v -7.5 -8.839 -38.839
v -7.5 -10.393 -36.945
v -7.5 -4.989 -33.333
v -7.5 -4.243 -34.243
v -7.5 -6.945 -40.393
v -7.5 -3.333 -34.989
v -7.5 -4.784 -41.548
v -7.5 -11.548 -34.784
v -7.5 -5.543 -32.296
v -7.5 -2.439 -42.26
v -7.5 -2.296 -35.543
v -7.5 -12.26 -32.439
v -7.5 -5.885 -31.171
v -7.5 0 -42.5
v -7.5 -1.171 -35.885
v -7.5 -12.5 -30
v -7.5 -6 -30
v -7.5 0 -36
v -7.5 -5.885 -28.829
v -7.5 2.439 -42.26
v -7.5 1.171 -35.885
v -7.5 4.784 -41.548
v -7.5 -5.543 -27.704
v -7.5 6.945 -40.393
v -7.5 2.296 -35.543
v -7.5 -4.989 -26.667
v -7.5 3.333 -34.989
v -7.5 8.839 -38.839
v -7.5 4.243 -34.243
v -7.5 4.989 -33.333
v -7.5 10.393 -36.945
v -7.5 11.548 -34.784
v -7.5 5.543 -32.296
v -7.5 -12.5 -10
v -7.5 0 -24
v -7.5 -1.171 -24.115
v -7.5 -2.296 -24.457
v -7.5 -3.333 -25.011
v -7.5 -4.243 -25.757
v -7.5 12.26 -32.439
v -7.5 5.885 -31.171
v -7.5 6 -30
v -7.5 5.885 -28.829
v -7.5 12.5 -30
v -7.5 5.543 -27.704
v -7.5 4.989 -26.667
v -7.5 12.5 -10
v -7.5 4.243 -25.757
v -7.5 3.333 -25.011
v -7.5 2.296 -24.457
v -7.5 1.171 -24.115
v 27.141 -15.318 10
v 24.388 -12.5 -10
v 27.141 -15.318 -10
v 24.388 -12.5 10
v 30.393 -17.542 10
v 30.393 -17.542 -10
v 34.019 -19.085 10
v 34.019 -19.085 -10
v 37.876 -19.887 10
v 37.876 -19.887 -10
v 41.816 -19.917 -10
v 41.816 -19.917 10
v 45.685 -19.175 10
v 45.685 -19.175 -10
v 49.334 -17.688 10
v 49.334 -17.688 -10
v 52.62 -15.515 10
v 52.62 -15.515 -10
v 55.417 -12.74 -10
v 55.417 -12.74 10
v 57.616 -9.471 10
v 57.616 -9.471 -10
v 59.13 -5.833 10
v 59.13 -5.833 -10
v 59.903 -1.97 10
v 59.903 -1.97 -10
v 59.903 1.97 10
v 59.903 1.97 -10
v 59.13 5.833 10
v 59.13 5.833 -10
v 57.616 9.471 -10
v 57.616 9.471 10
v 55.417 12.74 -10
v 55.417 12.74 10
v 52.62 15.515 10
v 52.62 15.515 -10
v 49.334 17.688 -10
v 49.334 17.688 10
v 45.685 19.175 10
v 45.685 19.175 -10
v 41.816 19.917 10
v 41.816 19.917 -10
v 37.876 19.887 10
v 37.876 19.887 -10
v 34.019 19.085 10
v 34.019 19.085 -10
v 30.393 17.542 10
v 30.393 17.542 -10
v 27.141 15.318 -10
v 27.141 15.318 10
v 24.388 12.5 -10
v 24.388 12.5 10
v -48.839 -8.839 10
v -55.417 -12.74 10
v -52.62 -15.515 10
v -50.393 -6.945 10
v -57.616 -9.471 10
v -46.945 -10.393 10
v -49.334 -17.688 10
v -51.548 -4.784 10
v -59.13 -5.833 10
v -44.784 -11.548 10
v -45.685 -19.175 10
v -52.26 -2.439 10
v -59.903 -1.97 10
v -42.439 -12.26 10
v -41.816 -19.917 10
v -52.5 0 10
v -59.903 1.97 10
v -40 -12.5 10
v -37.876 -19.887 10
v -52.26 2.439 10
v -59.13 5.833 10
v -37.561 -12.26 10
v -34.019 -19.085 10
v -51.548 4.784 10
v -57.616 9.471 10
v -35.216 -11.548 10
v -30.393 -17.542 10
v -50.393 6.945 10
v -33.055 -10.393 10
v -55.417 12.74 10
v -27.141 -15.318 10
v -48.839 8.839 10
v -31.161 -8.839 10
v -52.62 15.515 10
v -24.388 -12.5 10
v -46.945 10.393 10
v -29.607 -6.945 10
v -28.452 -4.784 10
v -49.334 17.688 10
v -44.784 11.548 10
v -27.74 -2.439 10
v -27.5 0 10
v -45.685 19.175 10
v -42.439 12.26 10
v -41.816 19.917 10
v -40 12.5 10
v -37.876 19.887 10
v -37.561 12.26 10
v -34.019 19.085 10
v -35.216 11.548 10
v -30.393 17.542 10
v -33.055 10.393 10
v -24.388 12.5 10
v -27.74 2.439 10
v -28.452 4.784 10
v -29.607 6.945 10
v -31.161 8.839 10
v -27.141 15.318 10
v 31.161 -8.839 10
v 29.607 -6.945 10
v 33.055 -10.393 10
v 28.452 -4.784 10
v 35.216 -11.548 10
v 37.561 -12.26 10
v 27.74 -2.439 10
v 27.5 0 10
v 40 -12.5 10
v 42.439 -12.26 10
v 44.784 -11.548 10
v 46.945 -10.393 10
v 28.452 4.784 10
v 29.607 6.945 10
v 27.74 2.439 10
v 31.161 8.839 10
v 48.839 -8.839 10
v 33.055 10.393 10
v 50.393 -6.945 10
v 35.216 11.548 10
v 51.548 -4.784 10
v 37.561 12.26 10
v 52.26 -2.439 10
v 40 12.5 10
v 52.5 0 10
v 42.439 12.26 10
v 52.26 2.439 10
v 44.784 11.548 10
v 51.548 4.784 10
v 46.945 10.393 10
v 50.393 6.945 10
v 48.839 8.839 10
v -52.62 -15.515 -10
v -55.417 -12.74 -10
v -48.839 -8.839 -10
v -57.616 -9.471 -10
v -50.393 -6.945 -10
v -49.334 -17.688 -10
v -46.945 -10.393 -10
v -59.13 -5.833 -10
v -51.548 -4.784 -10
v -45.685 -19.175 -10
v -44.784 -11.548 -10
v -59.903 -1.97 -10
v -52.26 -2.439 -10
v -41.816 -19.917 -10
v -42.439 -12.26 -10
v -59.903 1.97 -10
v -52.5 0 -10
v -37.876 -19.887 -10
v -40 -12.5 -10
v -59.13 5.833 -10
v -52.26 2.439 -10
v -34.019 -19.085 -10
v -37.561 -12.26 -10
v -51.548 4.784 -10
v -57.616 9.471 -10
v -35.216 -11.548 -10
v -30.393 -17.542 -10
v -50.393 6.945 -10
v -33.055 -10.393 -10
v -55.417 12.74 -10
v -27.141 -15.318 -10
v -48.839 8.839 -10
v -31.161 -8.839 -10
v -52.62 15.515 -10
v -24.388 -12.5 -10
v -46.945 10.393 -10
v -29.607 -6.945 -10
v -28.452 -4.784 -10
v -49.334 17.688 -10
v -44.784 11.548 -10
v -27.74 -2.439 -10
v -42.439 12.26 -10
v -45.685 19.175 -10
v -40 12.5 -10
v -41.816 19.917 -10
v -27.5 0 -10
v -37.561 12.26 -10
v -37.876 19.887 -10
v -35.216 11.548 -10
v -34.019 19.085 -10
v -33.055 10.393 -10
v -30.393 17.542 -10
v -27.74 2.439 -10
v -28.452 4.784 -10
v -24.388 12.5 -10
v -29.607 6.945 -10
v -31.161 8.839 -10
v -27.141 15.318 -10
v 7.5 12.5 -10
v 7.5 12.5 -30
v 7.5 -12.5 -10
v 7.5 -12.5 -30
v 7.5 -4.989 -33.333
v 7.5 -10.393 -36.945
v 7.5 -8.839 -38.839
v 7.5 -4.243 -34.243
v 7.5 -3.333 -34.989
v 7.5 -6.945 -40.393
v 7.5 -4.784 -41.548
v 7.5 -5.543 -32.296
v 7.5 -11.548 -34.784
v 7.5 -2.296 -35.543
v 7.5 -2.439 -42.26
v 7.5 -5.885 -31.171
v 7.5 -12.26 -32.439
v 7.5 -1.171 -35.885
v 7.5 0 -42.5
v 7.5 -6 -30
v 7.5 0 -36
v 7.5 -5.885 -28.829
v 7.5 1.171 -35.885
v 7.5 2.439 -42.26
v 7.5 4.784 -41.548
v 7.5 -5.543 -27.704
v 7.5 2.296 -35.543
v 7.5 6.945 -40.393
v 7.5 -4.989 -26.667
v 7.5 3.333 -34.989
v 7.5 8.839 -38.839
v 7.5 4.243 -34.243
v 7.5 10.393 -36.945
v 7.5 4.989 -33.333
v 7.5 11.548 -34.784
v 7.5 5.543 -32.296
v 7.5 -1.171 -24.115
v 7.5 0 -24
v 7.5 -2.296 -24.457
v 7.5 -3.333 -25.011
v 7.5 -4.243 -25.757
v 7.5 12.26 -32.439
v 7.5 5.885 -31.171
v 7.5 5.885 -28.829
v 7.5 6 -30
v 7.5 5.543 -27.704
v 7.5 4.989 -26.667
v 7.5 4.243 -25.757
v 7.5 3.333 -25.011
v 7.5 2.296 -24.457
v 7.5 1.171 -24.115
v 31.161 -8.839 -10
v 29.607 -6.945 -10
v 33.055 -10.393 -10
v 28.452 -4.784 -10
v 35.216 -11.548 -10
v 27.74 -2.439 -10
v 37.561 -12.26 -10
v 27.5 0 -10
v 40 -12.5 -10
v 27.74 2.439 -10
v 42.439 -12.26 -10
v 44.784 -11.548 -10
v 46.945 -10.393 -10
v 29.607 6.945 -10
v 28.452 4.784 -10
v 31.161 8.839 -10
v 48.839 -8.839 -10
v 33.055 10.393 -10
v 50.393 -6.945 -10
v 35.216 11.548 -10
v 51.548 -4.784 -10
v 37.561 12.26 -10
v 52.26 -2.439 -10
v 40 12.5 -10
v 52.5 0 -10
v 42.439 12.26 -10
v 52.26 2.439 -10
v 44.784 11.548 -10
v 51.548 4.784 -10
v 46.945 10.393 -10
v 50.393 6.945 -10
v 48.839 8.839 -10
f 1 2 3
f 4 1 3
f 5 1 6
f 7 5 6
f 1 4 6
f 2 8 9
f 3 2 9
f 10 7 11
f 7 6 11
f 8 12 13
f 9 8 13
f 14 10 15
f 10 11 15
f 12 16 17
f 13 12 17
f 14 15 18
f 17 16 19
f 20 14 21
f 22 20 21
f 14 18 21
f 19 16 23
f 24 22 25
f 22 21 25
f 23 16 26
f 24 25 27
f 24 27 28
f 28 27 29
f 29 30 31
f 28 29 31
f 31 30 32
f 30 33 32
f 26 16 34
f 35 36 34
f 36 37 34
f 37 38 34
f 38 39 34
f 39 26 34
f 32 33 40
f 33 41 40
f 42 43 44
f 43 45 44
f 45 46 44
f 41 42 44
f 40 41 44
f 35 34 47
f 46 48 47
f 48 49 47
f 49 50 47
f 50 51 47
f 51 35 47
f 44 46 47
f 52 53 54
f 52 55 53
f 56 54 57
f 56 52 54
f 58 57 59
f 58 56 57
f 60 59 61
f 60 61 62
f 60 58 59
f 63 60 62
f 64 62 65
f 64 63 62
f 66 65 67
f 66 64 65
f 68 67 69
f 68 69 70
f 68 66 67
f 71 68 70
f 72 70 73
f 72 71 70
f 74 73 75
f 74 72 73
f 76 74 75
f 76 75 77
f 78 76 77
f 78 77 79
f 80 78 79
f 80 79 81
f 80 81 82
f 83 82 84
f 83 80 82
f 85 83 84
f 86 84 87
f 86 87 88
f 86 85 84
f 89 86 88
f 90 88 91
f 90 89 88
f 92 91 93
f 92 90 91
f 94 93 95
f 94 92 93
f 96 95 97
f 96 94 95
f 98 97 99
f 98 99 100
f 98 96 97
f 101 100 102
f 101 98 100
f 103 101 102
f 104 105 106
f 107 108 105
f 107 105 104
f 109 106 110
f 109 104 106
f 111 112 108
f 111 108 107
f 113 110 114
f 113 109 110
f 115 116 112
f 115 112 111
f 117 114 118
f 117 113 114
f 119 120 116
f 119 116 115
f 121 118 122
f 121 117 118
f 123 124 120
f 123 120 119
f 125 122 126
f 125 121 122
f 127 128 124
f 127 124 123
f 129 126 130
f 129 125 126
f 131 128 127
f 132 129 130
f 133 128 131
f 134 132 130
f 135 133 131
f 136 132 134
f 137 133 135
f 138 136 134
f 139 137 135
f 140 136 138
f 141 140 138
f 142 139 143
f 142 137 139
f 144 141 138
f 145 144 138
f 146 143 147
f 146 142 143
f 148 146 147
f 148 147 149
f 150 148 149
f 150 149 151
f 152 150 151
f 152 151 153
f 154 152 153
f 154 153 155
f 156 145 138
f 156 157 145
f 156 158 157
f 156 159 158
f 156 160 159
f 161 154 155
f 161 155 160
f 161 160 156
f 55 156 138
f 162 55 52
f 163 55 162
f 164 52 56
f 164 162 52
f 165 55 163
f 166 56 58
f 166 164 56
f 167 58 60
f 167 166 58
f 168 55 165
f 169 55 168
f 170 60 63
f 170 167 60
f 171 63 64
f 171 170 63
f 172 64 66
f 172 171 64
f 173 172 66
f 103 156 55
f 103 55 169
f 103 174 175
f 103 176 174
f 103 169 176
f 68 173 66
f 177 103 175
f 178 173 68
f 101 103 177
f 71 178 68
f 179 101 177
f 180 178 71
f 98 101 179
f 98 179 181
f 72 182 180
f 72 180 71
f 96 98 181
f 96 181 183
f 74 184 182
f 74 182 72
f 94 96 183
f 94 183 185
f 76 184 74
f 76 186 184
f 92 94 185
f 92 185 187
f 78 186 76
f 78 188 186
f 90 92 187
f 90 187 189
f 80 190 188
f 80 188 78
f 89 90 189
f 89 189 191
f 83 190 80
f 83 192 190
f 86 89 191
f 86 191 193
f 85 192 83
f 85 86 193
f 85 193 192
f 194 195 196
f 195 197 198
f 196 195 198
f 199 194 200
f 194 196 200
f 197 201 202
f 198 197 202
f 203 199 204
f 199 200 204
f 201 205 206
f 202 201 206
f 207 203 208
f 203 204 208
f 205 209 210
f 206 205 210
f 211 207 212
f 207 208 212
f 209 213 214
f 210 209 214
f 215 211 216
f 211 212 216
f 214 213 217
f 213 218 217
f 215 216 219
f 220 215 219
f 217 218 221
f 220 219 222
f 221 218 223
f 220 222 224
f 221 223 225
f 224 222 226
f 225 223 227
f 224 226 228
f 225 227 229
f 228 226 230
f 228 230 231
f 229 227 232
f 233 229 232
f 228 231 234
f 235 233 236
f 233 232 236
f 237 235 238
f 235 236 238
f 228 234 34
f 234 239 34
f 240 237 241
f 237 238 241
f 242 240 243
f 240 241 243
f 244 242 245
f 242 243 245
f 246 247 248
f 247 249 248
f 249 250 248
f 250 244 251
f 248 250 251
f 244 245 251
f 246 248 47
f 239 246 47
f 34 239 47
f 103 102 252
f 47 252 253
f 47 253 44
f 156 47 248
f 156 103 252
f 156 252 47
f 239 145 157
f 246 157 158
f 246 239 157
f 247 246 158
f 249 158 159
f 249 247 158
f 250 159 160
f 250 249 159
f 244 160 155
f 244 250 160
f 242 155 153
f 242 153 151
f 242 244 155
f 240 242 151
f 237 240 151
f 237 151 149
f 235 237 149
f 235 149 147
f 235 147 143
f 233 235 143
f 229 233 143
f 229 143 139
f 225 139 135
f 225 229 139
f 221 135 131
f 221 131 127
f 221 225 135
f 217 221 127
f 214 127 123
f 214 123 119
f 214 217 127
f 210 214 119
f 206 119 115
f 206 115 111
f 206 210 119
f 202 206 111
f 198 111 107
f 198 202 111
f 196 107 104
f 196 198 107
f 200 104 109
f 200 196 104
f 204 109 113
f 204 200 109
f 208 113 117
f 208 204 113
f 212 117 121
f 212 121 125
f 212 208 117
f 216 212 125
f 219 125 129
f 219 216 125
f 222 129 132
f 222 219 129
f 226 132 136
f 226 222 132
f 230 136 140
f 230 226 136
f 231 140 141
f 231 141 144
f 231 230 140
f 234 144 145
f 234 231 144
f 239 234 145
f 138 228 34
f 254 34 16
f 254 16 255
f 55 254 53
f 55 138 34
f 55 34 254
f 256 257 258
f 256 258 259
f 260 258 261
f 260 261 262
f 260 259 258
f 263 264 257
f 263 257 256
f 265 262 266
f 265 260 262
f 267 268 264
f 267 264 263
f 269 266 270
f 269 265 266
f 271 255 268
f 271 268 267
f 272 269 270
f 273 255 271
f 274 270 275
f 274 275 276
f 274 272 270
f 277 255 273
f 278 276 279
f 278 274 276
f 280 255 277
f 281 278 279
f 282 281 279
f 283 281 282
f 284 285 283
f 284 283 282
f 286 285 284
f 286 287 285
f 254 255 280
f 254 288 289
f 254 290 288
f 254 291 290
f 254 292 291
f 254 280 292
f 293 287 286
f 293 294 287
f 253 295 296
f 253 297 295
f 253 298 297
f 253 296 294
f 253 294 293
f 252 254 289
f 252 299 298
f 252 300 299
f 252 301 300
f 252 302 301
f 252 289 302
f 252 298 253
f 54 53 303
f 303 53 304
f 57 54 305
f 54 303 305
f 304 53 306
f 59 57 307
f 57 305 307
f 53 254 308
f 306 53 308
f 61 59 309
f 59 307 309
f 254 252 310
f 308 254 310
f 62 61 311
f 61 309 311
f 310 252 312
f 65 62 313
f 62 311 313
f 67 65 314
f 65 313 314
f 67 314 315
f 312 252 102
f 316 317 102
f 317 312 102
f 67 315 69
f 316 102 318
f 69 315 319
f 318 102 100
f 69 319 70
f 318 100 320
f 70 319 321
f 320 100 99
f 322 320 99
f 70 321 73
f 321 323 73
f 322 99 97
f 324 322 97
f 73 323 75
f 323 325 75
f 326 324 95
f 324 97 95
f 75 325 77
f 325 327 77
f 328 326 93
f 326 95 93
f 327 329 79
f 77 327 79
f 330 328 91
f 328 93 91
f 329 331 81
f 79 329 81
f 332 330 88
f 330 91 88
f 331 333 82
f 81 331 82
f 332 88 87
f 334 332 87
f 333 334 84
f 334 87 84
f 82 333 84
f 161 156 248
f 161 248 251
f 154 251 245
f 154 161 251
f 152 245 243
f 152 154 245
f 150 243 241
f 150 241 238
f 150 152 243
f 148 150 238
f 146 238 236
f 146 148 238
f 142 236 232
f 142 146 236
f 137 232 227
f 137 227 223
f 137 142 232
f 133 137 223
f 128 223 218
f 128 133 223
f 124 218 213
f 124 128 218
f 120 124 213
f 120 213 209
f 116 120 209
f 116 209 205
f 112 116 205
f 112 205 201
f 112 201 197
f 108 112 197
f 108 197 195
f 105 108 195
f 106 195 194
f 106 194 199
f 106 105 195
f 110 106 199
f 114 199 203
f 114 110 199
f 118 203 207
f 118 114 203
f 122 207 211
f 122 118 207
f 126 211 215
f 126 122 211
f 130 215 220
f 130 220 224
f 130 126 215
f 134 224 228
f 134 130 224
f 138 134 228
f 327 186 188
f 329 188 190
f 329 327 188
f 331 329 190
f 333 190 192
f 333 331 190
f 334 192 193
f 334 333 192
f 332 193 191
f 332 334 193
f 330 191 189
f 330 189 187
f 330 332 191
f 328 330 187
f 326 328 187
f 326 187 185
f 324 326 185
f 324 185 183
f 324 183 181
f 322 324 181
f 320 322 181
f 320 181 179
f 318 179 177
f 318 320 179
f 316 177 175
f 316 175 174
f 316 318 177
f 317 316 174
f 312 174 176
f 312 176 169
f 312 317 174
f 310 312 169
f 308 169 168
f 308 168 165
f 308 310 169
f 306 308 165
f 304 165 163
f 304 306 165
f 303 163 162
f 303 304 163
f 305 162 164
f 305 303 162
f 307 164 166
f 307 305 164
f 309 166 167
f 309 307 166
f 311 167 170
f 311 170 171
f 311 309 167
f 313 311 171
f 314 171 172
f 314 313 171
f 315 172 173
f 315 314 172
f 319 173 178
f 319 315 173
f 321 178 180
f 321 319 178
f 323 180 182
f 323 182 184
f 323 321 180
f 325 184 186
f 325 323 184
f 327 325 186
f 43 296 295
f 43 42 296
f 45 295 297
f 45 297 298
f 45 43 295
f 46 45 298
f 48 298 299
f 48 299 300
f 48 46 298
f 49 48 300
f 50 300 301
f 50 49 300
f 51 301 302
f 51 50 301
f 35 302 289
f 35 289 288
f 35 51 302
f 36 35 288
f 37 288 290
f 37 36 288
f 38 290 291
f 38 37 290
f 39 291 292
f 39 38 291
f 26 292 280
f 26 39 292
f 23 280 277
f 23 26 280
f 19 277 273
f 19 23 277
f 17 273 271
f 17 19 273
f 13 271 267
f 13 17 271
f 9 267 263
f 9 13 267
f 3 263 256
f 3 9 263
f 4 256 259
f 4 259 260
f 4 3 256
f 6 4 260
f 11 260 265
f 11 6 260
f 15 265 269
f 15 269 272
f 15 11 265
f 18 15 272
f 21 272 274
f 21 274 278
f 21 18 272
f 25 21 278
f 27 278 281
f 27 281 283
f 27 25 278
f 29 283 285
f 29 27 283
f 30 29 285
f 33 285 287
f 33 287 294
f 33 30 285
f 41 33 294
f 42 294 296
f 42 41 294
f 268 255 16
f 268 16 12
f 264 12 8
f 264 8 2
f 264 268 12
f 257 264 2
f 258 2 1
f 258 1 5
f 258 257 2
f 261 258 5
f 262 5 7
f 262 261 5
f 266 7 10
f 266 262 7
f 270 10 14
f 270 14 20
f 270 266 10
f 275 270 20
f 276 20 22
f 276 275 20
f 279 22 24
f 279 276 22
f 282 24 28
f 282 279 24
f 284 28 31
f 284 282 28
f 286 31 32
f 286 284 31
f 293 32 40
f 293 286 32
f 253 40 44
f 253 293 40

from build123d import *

# Parameters (mm, degrees)
F0_R     = 12.5
F1_DEPTH = 10
F2_R     = 6
F3_DEPTH = 7.5


with BuildPart() as f1:
    # F0 (on Top) → F1 (new body, symmetric)
    with BuildSketch(Plane.XY):
        with BuildLine():
            Line((24.387505, 12.5), (-24.387505, 12.5))
            ThreePointArc((-24.387505, 12.5), (-60, 0), (-24.387505, -12.5))
            Line((-24.387505, -12.5), (24.387505, -12.5))
            ThreePointArc((24.387505, -12.5), (60, 0), (24.387505, 12.5))
        make_face()
        with Locations((-40, 0)):
            Circle(F0_R, mode=Mode.SUBTRACT)
        with Locations((40, 0)):
            Circle(F0_R, mode=Mode.SUBTRACT)
    extrude(amount=F1_DEPTH, both=True)

    # F2 (on Right) → F3 (join, symmetric)
    with BuildSketch(Plane.YZ):
        with BuildLine():
            Line((12.5, -10), (-12.5, -10))
            Line((-12.5, -10), (-12.5, -30))
            ThreePointArc((-12.5, -30), (0, -42.5), (12.5, -30))
            Line((12.5, -30), (12.5, -10))
        make_face()
        with Locations((0, -30)):
            Circle(F2_R, mode=Mode.SUBTRACT)
    extrude(amount=F3_DEPTH, both=True)


solid = f1.part
